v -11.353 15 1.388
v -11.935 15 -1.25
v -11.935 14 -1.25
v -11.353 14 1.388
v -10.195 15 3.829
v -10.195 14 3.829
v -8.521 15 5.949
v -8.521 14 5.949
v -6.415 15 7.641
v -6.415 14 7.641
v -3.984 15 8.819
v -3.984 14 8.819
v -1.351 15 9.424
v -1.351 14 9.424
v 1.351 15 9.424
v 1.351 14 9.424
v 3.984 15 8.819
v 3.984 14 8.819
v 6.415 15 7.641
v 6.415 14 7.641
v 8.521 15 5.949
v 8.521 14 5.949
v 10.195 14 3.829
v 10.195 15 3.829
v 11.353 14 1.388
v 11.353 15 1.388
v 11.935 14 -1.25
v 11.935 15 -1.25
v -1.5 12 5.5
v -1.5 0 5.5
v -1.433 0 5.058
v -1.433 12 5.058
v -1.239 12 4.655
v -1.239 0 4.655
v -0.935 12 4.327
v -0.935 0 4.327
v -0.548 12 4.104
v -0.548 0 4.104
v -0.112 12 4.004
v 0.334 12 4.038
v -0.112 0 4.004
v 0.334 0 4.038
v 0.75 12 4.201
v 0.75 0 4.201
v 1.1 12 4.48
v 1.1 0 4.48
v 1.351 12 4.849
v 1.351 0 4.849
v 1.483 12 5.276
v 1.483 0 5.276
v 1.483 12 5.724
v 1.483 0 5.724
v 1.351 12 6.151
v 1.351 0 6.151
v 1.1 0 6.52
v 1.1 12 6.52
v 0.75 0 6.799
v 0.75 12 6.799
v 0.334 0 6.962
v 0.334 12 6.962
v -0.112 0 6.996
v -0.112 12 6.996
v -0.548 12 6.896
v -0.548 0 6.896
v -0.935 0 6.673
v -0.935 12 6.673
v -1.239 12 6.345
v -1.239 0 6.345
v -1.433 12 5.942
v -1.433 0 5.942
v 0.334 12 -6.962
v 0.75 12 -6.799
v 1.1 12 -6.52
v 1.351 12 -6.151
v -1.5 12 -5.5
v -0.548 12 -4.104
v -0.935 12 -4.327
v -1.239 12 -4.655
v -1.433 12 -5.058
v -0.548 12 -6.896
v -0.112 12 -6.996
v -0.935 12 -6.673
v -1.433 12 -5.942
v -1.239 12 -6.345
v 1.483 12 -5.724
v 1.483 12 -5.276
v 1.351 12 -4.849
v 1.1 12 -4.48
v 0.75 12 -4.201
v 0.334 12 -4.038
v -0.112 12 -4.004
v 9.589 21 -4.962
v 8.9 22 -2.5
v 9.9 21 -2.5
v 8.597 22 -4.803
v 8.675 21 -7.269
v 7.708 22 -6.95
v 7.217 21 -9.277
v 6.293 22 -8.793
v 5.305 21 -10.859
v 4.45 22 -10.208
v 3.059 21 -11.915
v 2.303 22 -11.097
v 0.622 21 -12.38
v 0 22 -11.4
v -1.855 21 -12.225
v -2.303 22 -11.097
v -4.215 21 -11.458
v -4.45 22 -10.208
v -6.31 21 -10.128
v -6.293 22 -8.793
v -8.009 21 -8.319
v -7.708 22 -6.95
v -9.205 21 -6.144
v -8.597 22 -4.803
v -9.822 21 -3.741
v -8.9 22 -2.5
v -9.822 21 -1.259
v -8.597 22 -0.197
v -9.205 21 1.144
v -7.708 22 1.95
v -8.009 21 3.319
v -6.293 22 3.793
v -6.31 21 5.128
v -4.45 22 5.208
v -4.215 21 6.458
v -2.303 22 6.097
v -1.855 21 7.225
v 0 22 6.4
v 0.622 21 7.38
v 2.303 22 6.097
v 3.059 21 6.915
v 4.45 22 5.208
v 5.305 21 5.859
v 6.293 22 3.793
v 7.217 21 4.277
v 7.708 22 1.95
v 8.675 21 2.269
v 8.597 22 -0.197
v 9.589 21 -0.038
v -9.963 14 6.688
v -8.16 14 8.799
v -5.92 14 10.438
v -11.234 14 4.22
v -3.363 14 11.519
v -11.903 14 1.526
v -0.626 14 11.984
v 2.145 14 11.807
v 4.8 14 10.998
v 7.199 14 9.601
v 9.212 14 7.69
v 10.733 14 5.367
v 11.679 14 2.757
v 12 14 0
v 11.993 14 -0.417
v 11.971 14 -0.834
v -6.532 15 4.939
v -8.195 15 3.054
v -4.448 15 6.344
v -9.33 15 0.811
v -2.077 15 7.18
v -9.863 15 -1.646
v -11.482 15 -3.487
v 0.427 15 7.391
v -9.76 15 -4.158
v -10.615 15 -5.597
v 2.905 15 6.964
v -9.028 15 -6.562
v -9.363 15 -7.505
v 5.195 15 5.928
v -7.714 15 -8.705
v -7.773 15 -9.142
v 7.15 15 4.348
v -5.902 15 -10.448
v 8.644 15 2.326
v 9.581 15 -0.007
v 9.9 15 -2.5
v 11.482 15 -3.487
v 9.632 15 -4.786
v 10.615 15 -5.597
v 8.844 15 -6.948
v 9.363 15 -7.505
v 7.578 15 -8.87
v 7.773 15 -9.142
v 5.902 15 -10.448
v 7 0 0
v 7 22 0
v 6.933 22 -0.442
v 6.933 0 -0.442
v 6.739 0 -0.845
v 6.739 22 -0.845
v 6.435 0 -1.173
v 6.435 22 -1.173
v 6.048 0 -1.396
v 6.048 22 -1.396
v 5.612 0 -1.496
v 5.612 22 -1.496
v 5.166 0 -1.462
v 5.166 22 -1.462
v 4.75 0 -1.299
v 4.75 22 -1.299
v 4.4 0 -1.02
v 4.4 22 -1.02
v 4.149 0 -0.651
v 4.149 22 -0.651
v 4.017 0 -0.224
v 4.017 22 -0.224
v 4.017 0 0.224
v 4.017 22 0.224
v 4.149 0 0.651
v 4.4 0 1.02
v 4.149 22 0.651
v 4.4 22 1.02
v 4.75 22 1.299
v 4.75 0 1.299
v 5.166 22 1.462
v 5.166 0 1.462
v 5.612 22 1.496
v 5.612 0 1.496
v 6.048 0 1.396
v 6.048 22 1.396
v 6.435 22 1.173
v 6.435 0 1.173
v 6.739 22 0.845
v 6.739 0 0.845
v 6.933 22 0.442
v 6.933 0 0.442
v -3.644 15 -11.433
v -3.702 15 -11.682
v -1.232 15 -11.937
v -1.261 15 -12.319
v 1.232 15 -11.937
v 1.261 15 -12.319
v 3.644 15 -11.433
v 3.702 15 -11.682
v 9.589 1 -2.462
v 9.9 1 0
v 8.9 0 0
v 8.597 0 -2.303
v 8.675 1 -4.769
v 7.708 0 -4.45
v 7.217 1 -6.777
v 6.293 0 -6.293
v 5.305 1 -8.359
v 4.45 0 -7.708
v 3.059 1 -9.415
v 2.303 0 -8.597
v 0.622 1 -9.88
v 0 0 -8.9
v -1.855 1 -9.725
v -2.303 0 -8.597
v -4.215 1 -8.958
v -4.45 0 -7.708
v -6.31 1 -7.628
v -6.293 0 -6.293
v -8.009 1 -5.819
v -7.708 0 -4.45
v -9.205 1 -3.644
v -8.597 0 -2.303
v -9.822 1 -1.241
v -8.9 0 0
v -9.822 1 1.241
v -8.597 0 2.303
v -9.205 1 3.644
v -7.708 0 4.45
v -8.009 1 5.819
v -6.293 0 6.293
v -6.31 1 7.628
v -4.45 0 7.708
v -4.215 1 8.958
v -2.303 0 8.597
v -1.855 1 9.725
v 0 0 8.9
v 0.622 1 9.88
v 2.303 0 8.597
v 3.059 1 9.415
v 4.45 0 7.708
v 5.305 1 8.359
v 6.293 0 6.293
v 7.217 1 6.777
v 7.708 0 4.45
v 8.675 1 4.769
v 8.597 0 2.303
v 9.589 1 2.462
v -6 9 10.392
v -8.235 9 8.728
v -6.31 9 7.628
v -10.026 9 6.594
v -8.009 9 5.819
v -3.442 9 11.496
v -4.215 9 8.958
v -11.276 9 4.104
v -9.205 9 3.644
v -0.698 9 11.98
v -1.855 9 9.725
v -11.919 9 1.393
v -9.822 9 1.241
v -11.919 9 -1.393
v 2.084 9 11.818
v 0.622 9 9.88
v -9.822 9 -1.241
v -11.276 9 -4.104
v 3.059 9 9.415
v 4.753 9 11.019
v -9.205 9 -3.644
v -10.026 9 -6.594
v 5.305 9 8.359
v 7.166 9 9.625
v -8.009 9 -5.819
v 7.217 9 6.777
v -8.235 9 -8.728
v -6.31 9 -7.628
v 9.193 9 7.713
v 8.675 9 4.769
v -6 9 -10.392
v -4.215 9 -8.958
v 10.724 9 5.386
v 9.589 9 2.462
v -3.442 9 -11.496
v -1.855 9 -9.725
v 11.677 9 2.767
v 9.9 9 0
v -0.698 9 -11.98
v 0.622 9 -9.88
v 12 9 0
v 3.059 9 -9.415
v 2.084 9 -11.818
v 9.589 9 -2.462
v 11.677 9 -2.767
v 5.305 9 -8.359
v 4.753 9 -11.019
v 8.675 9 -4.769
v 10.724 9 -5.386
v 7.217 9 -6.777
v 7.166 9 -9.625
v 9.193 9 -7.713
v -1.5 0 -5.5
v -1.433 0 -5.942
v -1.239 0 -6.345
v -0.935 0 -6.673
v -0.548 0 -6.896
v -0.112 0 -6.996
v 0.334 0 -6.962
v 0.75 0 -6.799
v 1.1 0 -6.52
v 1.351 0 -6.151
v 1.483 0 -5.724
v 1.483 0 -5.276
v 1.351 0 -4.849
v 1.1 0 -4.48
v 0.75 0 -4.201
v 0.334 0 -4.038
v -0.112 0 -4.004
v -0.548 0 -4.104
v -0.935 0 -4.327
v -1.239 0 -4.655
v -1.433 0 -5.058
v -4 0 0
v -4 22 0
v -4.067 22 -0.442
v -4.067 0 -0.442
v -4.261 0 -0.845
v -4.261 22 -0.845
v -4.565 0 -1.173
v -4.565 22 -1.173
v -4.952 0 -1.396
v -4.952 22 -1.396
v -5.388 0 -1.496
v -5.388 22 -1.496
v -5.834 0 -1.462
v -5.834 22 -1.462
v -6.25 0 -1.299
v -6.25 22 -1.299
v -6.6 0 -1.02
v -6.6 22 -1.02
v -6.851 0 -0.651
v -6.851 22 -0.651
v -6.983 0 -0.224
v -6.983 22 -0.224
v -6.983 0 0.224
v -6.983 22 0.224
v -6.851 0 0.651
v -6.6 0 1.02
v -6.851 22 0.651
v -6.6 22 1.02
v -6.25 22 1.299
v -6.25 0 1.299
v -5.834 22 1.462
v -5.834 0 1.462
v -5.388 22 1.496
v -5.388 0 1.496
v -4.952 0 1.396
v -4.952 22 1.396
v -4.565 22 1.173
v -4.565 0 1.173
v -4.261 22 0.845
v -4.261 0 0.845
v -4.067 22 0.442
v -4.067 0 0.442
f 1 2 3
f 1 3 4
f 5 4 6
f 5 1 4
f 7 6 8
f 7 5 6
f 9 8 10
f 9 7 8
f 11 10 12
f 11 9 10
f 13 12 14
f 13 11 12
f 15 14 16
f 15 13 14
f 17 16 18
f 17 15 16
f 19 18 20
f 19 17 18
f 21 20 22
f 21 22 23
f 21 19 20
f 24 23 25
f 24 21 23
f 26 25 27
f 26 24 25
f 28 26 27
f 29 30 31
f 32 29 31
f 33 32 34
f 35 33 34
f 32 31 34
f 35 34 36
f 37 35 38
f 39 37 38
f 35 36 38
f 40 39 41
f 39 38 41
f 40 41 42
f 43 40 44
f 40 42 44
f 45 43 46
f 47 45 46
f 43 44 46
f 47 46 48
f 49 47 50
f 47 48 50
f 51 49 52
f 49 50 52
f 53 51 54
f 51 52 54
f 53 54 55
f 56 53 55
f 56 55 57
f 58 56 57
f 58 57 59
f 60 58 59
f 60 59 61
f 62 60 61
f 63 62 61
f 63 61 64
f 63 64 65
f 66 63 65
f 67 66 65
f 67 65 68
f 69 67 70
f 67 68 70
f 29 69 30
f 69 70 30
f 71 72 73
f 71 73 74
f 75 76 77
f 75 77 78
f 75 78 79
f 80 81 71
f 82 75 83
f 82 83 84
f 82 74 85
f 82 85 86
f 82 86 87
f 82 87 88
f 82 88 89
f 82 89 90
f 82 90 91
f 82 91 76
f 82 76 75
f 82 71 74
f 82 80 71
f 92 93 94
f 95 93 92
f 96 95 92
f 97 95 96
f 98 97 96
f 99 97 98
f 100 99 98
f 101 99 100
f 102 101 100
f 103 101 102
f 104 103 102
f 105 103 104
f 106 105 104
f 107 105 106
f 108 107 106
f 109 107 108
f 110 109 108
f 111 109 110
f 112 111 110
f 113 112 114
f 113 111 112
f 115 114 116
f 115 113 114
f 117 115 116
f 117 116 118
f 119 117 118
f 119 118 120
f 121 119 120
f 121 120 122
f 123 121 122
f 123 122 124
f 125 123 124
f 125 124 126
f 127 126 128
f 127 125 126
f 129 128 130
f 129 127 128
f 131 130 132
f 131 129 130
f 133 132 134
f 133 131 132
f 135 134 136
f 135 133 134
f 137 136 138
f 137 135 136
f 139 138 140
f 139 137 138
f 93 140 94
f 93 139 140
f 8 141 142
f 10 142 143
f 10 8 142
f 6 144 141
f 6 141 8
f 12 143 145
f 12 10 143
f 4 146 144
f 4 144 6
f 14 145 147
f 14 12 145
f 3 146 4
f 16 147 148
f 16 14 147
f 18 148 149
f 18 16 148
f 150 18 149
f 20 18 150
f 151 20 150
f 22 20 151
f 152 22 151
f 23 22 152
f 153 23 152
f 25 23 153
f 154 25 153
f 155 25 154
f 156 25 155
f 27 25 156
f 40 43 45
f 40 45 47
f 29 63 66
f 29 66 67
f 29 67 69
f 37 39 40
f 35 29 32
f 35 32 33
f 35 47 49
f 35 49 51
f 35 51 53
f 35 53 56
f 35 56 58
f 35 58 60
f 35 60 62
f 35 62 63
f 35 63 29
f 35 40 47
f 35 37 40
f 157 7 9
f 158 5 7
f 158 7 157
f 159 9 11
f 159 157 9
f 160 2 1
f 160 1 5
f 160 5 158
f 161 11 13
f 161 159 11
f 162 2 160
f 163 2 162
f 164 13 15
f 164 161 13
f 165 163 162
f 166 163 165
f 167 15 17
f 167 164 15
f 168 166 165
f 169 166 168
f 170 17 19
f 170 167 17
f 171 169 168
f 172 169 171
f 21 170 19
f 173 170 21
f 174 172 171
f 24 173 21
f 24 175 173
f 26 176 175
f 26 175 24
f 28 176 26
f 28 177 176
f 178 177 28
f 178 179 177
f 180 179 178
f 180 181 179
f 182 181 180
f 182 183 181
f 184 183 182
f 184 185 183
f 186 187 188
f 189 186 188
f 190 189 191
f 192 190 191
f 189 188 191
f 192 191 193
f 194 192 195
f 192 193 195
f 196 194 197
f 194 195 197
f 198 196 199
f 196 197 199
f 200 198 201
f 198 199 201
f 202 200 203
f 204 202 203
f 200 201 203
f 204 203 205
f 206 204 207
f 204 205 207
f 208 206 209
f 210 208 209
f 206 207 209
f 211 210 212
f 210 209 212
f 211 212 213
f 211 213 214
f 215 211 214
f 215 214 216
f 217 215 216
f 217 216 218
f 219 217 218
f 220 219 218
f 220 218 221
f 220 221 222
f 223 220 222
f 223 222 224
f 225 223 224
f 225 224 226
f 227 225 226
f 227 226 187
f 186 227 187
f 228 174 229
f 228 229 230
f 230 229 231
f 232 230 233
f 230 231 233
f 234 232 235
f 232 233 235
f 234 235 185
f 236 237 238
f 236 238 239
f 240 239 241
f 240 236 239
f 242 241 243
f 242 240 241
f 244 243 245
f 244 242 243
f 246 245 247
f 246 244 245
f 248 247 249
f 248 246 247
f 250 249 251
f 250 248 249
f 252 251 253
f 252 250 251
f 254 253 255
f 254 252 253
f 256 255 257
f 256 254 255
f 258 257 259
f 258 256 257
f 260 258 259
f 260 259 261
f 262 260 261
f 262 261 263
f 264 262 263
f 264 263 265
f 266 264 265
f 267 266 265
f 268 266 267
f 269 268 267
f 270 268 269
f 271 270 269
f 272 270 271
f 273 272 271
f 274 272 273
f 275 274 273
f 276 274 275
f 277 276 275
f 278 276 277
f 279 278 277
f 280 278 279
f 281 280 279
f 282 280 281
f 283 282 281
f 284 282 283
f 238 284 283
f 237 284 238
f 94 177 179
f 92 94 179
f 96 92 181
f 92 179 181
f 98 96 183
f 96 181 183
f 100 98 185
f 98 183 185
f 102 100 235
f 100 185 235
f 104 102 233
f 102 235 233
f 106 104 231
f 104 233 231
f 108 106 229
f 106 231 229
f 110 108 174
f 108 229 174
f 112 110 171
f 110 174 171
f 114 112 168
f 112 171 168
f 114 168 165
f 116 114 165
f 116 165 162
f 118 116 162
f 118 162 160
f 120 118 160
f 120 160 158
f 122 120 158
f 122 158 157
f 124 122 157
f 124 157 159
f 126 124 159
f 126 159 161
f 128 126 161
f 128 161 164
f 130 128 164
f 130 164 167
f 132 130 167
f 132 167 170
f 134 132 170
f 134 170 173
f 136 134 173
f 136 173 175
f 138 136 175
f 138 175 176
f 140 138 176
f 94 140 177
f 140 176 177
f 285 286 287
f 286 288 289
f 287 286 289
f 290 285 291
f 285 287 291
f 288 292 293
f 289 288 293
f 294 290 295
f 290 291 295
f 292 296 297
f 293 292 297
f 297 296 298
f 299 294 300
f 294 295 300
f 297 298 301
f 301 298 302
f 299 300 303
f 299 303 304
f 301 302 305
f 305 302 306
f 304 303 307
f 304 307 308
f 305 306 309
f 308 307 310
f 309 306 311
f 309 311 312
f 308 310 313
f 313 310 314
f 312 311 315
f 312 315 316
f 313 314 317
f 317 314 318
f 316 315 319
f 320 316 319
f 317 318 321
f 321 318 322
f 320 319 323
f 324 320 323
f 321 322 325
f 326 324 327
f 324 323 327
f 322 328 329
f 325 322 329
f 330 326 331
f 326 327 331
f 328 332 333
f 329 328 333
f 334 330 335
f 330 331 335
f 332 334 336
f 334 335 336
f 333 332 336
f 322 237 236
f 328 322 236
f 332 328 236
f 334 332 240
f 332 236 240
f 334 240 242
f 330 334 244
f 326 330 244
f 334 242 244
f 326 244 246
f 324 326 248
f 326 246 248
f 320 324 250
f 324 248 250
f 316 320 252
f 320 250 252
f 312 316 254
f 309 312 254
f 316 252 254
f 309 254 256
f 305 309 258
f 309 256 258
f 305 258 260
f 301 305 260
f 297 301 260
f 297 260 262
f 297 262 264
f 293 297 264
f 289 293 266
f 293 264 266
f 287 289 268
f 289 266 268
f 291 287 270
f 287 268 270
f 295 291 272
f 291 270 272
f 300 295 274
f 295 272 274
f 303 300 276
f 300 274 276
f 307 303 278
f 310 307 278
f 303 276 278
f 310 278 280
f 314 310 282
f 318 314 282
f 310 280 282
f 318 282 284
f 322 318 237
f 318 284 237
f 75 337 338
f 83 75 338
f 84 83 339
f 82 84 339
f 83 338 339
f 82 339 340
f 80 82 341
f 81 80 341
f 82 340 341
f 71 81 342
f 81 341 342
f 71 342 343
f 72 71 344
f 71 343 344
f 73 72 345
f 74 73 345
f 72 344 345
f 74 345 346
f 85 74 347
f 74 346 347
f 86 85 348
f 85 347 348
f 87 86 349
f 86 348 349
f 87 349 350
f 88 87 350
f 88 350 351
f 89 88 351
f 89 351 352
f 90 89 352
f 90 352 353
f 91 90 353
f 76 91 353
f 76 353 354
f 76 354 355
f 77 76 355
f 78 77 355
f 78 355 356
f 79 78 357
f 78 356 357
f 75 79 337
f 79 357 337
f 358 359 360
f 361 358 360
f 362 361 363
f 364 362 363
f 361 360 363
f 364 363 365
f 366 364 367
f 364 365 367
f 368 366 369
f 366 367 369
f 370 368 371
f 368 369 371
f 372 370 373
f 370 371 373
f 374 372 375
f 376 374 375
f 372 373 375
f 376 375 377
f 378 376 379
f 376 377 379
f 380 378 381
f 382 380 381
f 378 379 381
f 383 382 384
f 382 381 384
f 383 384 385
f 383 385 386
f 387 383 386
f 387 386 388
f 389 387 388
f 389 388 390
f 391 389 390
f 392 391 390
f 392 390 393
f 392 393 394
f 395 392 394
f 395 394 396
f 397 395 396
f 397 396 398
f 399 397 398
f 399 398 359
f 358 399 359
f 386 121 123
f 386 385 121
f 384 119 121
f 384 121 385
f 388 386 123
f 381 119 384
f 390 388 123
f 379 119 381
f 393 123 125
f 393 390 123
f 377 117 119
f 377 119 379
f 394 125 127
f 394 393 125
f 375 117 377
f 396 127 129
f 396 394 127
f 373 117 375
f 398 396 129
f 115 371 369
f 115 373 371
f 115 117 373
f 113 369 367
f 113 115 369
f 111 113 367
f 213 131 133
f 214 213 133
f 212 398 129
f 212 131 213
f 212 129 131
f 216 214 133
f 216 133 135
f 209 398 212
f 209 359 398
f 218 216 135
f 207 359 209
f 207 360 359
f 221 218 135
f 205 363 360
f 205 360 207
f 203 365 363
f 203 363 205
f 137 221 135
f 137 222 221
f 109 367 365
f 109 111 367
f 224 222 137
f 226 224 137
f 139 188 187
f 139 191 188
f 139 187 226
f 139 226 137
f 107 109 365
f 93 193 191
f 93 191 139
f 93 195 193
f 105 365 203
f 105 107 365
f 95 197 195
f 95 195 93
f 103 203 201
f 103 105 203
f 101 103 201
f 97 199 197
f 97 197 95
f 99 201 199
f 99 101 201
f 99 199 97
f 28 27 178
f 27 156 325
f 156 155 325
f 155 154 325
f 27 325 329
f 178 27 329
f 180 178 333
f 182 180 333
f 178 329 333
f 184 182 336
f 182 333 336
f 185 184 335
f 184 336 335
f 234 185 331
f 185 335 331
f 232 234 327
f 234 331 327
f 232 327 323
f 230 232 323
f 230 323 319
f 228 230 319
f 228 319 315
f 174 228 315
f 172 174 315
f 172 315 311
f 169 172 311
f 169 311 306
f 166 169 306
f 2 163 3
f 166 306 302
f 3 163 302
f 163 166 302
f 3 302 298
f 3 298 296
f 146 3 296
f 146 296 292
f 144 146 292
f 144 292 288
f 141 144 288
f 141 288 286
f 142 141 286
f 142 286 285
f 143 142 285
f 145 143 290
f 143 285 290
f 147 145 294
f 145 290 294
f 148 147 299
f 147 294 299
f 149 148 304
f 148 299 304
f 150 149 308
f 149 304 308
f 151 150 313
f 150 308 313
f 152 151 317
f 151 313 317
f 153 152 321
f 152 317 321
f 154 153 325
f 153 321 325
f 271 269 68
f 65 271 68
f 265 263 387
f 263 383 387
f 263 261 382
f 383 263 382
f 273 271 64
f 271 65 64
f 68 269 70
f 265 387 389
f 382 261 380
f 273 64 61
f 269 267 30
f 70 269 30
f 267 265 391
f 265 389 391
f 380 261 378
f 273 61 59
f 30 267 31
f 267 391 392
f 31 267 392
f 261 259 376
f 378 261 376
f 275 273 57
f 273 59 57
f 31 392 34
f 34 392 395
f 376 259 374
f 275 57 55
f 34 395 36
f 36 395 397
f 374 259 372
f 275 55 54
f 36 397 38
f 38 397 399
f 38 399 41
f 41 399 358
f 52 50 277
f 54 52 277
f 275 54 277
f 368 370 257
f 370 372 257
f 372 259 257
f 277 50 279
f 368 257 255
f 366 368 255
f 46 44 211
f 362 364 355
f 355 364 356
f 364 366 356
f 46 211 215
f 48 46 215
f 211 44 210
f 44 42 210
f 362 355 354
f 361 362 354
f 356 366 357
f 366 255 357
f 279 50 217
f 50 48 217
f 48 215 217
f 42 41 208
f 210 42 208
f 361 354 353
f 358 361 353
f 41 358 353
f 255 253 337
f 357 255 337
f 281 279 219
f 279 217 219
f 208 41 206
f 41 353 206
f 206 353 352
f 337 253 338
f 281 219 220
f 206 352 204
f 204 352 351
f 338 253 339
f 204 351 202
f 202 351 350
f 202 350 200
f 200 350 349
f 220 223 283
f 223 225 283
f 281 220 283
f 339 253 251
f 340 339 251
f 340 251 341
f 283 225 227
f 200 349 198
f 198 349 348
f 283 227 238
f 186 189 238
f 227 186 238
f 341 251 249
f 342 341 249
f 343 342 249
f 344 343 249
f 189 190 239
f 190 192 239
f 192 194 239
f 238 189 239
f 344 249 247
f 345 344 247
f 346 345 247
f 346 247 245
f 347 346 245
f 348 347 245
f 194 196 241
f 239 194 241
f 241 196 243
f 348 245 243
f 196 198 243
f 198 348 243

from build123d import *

# Parameters (mm, degrees)
SKETCH1_R           = 9.9
BOSS_EXTRUDE1_DEPTH = 9
SKETCH2_R           = 12
BOSS_EXTRUDE2_DEPTH = 6
SKETCH3_R           = 9.9
BOSS_EXTRUDE3_DEPTH = 7
SKETCH7_R           = 15
SKETCH7_R_2         = 12
CUT_EXTRUDE3_DEPTH  = 1
SKETCH10_R          = 1.5
CUT_EXTRUDE4_DEPTH  = 23
SKETCH12_R          = 1.5
CUT_EXTRUDE5_DEPTH  = 12
CHAMFER1_SIZE       = 1


with BuildPart() as part:
    # Sketch1 → Boss-Extrude1 (new body)
    with BuildSketch(Plane(origin=(0, 0, 0), x_dir=(1, 0, 0), z_dir=(0, 1, 0))):
        Circle(SKETCH1_R)
    extrude(amount=BOSS_EXTRUDE1_DEPTH)

    # Sketch2 → Boss-Extrude2 (add)
    with BuildSketch(Plane(origin=(0, 9, 0), x_dir=(1, 0, 0), z_dir=(0, 1, 0))):
        Circle(SKETCH2_R)
    extrude(amount=BOSS_EXTRUDE2_DEPTH)

    # Sketch3 → Boss-Extrude3 (add)
    with BuildSketch(Plane(origin=(0, 15, 0), x_dir=(1, 0, 0), z_dir=(0, 1, 0))):
        with Locations((0, 2.5)):
            Circle(SKETCH3_R)
    extrude(amount=BOSS_EXTRUDE3_DEPTH)

    # Sketch7 → Cut-Extrude3 (cut)
    with BuildSketch(Plane(origin=(0, 15, 0), x_dir=(1, 0, 0), z_dir=(0, 1, 0))):
        with Locations((0, 2.5)):
            Circle(SKETCH7_R)
        with Locations((0, 2.5)):
            Circle(SKETCH7_R_2, mode=Mode.SUBTRACT)
    extrude(amount=-CUT_EXTRUDE3_DEPTH, mode=Mode.SUBTRACT)

    # Sketch10 → Cut-Extrude4 (cut, through all)
    with BuildSketch(Plane(origin=(0, 22, 0), x_dir=(1, 0, 0), z_dir=(0, 1, 0))):
        with Locations((5.5, 0)):
            Circle(SKETCH10_R)
        with Locations((-5.5, 0)):
            Circle(SKETCH10_R)
    extrude(amount=-CUT_EXTRUDE4_DEPTH, mode=Mode.SUBTRACT)

    # Sketch12 → Cut-Extrude5 (cut)
    with BuildSketch(Plane(origin=(0, 0, 0), x_dir=(-1, 0, 0), z_dir=(0, -1, 0))):
        with Locations((0, 5.5)):
            Circle(SKETCH12_R)
        with Locations((0, -5.5)):
            Circle(SKETCH12_R)
    extrude(amount=-CUT_EXTRUDE5_DEPTH, mode=Mode.SUBTRACT)

    # Chamfer1
    chamfer1_edges = [part.edges().sort_by_distance(p)[0] for p in [
        (-9.9, 22, -2.5),
        (-9.9, 0, 0),
    ]]
    chamfer(chamfer1_edges, length=CHAMFER1_SIZE)


solid = part.part
